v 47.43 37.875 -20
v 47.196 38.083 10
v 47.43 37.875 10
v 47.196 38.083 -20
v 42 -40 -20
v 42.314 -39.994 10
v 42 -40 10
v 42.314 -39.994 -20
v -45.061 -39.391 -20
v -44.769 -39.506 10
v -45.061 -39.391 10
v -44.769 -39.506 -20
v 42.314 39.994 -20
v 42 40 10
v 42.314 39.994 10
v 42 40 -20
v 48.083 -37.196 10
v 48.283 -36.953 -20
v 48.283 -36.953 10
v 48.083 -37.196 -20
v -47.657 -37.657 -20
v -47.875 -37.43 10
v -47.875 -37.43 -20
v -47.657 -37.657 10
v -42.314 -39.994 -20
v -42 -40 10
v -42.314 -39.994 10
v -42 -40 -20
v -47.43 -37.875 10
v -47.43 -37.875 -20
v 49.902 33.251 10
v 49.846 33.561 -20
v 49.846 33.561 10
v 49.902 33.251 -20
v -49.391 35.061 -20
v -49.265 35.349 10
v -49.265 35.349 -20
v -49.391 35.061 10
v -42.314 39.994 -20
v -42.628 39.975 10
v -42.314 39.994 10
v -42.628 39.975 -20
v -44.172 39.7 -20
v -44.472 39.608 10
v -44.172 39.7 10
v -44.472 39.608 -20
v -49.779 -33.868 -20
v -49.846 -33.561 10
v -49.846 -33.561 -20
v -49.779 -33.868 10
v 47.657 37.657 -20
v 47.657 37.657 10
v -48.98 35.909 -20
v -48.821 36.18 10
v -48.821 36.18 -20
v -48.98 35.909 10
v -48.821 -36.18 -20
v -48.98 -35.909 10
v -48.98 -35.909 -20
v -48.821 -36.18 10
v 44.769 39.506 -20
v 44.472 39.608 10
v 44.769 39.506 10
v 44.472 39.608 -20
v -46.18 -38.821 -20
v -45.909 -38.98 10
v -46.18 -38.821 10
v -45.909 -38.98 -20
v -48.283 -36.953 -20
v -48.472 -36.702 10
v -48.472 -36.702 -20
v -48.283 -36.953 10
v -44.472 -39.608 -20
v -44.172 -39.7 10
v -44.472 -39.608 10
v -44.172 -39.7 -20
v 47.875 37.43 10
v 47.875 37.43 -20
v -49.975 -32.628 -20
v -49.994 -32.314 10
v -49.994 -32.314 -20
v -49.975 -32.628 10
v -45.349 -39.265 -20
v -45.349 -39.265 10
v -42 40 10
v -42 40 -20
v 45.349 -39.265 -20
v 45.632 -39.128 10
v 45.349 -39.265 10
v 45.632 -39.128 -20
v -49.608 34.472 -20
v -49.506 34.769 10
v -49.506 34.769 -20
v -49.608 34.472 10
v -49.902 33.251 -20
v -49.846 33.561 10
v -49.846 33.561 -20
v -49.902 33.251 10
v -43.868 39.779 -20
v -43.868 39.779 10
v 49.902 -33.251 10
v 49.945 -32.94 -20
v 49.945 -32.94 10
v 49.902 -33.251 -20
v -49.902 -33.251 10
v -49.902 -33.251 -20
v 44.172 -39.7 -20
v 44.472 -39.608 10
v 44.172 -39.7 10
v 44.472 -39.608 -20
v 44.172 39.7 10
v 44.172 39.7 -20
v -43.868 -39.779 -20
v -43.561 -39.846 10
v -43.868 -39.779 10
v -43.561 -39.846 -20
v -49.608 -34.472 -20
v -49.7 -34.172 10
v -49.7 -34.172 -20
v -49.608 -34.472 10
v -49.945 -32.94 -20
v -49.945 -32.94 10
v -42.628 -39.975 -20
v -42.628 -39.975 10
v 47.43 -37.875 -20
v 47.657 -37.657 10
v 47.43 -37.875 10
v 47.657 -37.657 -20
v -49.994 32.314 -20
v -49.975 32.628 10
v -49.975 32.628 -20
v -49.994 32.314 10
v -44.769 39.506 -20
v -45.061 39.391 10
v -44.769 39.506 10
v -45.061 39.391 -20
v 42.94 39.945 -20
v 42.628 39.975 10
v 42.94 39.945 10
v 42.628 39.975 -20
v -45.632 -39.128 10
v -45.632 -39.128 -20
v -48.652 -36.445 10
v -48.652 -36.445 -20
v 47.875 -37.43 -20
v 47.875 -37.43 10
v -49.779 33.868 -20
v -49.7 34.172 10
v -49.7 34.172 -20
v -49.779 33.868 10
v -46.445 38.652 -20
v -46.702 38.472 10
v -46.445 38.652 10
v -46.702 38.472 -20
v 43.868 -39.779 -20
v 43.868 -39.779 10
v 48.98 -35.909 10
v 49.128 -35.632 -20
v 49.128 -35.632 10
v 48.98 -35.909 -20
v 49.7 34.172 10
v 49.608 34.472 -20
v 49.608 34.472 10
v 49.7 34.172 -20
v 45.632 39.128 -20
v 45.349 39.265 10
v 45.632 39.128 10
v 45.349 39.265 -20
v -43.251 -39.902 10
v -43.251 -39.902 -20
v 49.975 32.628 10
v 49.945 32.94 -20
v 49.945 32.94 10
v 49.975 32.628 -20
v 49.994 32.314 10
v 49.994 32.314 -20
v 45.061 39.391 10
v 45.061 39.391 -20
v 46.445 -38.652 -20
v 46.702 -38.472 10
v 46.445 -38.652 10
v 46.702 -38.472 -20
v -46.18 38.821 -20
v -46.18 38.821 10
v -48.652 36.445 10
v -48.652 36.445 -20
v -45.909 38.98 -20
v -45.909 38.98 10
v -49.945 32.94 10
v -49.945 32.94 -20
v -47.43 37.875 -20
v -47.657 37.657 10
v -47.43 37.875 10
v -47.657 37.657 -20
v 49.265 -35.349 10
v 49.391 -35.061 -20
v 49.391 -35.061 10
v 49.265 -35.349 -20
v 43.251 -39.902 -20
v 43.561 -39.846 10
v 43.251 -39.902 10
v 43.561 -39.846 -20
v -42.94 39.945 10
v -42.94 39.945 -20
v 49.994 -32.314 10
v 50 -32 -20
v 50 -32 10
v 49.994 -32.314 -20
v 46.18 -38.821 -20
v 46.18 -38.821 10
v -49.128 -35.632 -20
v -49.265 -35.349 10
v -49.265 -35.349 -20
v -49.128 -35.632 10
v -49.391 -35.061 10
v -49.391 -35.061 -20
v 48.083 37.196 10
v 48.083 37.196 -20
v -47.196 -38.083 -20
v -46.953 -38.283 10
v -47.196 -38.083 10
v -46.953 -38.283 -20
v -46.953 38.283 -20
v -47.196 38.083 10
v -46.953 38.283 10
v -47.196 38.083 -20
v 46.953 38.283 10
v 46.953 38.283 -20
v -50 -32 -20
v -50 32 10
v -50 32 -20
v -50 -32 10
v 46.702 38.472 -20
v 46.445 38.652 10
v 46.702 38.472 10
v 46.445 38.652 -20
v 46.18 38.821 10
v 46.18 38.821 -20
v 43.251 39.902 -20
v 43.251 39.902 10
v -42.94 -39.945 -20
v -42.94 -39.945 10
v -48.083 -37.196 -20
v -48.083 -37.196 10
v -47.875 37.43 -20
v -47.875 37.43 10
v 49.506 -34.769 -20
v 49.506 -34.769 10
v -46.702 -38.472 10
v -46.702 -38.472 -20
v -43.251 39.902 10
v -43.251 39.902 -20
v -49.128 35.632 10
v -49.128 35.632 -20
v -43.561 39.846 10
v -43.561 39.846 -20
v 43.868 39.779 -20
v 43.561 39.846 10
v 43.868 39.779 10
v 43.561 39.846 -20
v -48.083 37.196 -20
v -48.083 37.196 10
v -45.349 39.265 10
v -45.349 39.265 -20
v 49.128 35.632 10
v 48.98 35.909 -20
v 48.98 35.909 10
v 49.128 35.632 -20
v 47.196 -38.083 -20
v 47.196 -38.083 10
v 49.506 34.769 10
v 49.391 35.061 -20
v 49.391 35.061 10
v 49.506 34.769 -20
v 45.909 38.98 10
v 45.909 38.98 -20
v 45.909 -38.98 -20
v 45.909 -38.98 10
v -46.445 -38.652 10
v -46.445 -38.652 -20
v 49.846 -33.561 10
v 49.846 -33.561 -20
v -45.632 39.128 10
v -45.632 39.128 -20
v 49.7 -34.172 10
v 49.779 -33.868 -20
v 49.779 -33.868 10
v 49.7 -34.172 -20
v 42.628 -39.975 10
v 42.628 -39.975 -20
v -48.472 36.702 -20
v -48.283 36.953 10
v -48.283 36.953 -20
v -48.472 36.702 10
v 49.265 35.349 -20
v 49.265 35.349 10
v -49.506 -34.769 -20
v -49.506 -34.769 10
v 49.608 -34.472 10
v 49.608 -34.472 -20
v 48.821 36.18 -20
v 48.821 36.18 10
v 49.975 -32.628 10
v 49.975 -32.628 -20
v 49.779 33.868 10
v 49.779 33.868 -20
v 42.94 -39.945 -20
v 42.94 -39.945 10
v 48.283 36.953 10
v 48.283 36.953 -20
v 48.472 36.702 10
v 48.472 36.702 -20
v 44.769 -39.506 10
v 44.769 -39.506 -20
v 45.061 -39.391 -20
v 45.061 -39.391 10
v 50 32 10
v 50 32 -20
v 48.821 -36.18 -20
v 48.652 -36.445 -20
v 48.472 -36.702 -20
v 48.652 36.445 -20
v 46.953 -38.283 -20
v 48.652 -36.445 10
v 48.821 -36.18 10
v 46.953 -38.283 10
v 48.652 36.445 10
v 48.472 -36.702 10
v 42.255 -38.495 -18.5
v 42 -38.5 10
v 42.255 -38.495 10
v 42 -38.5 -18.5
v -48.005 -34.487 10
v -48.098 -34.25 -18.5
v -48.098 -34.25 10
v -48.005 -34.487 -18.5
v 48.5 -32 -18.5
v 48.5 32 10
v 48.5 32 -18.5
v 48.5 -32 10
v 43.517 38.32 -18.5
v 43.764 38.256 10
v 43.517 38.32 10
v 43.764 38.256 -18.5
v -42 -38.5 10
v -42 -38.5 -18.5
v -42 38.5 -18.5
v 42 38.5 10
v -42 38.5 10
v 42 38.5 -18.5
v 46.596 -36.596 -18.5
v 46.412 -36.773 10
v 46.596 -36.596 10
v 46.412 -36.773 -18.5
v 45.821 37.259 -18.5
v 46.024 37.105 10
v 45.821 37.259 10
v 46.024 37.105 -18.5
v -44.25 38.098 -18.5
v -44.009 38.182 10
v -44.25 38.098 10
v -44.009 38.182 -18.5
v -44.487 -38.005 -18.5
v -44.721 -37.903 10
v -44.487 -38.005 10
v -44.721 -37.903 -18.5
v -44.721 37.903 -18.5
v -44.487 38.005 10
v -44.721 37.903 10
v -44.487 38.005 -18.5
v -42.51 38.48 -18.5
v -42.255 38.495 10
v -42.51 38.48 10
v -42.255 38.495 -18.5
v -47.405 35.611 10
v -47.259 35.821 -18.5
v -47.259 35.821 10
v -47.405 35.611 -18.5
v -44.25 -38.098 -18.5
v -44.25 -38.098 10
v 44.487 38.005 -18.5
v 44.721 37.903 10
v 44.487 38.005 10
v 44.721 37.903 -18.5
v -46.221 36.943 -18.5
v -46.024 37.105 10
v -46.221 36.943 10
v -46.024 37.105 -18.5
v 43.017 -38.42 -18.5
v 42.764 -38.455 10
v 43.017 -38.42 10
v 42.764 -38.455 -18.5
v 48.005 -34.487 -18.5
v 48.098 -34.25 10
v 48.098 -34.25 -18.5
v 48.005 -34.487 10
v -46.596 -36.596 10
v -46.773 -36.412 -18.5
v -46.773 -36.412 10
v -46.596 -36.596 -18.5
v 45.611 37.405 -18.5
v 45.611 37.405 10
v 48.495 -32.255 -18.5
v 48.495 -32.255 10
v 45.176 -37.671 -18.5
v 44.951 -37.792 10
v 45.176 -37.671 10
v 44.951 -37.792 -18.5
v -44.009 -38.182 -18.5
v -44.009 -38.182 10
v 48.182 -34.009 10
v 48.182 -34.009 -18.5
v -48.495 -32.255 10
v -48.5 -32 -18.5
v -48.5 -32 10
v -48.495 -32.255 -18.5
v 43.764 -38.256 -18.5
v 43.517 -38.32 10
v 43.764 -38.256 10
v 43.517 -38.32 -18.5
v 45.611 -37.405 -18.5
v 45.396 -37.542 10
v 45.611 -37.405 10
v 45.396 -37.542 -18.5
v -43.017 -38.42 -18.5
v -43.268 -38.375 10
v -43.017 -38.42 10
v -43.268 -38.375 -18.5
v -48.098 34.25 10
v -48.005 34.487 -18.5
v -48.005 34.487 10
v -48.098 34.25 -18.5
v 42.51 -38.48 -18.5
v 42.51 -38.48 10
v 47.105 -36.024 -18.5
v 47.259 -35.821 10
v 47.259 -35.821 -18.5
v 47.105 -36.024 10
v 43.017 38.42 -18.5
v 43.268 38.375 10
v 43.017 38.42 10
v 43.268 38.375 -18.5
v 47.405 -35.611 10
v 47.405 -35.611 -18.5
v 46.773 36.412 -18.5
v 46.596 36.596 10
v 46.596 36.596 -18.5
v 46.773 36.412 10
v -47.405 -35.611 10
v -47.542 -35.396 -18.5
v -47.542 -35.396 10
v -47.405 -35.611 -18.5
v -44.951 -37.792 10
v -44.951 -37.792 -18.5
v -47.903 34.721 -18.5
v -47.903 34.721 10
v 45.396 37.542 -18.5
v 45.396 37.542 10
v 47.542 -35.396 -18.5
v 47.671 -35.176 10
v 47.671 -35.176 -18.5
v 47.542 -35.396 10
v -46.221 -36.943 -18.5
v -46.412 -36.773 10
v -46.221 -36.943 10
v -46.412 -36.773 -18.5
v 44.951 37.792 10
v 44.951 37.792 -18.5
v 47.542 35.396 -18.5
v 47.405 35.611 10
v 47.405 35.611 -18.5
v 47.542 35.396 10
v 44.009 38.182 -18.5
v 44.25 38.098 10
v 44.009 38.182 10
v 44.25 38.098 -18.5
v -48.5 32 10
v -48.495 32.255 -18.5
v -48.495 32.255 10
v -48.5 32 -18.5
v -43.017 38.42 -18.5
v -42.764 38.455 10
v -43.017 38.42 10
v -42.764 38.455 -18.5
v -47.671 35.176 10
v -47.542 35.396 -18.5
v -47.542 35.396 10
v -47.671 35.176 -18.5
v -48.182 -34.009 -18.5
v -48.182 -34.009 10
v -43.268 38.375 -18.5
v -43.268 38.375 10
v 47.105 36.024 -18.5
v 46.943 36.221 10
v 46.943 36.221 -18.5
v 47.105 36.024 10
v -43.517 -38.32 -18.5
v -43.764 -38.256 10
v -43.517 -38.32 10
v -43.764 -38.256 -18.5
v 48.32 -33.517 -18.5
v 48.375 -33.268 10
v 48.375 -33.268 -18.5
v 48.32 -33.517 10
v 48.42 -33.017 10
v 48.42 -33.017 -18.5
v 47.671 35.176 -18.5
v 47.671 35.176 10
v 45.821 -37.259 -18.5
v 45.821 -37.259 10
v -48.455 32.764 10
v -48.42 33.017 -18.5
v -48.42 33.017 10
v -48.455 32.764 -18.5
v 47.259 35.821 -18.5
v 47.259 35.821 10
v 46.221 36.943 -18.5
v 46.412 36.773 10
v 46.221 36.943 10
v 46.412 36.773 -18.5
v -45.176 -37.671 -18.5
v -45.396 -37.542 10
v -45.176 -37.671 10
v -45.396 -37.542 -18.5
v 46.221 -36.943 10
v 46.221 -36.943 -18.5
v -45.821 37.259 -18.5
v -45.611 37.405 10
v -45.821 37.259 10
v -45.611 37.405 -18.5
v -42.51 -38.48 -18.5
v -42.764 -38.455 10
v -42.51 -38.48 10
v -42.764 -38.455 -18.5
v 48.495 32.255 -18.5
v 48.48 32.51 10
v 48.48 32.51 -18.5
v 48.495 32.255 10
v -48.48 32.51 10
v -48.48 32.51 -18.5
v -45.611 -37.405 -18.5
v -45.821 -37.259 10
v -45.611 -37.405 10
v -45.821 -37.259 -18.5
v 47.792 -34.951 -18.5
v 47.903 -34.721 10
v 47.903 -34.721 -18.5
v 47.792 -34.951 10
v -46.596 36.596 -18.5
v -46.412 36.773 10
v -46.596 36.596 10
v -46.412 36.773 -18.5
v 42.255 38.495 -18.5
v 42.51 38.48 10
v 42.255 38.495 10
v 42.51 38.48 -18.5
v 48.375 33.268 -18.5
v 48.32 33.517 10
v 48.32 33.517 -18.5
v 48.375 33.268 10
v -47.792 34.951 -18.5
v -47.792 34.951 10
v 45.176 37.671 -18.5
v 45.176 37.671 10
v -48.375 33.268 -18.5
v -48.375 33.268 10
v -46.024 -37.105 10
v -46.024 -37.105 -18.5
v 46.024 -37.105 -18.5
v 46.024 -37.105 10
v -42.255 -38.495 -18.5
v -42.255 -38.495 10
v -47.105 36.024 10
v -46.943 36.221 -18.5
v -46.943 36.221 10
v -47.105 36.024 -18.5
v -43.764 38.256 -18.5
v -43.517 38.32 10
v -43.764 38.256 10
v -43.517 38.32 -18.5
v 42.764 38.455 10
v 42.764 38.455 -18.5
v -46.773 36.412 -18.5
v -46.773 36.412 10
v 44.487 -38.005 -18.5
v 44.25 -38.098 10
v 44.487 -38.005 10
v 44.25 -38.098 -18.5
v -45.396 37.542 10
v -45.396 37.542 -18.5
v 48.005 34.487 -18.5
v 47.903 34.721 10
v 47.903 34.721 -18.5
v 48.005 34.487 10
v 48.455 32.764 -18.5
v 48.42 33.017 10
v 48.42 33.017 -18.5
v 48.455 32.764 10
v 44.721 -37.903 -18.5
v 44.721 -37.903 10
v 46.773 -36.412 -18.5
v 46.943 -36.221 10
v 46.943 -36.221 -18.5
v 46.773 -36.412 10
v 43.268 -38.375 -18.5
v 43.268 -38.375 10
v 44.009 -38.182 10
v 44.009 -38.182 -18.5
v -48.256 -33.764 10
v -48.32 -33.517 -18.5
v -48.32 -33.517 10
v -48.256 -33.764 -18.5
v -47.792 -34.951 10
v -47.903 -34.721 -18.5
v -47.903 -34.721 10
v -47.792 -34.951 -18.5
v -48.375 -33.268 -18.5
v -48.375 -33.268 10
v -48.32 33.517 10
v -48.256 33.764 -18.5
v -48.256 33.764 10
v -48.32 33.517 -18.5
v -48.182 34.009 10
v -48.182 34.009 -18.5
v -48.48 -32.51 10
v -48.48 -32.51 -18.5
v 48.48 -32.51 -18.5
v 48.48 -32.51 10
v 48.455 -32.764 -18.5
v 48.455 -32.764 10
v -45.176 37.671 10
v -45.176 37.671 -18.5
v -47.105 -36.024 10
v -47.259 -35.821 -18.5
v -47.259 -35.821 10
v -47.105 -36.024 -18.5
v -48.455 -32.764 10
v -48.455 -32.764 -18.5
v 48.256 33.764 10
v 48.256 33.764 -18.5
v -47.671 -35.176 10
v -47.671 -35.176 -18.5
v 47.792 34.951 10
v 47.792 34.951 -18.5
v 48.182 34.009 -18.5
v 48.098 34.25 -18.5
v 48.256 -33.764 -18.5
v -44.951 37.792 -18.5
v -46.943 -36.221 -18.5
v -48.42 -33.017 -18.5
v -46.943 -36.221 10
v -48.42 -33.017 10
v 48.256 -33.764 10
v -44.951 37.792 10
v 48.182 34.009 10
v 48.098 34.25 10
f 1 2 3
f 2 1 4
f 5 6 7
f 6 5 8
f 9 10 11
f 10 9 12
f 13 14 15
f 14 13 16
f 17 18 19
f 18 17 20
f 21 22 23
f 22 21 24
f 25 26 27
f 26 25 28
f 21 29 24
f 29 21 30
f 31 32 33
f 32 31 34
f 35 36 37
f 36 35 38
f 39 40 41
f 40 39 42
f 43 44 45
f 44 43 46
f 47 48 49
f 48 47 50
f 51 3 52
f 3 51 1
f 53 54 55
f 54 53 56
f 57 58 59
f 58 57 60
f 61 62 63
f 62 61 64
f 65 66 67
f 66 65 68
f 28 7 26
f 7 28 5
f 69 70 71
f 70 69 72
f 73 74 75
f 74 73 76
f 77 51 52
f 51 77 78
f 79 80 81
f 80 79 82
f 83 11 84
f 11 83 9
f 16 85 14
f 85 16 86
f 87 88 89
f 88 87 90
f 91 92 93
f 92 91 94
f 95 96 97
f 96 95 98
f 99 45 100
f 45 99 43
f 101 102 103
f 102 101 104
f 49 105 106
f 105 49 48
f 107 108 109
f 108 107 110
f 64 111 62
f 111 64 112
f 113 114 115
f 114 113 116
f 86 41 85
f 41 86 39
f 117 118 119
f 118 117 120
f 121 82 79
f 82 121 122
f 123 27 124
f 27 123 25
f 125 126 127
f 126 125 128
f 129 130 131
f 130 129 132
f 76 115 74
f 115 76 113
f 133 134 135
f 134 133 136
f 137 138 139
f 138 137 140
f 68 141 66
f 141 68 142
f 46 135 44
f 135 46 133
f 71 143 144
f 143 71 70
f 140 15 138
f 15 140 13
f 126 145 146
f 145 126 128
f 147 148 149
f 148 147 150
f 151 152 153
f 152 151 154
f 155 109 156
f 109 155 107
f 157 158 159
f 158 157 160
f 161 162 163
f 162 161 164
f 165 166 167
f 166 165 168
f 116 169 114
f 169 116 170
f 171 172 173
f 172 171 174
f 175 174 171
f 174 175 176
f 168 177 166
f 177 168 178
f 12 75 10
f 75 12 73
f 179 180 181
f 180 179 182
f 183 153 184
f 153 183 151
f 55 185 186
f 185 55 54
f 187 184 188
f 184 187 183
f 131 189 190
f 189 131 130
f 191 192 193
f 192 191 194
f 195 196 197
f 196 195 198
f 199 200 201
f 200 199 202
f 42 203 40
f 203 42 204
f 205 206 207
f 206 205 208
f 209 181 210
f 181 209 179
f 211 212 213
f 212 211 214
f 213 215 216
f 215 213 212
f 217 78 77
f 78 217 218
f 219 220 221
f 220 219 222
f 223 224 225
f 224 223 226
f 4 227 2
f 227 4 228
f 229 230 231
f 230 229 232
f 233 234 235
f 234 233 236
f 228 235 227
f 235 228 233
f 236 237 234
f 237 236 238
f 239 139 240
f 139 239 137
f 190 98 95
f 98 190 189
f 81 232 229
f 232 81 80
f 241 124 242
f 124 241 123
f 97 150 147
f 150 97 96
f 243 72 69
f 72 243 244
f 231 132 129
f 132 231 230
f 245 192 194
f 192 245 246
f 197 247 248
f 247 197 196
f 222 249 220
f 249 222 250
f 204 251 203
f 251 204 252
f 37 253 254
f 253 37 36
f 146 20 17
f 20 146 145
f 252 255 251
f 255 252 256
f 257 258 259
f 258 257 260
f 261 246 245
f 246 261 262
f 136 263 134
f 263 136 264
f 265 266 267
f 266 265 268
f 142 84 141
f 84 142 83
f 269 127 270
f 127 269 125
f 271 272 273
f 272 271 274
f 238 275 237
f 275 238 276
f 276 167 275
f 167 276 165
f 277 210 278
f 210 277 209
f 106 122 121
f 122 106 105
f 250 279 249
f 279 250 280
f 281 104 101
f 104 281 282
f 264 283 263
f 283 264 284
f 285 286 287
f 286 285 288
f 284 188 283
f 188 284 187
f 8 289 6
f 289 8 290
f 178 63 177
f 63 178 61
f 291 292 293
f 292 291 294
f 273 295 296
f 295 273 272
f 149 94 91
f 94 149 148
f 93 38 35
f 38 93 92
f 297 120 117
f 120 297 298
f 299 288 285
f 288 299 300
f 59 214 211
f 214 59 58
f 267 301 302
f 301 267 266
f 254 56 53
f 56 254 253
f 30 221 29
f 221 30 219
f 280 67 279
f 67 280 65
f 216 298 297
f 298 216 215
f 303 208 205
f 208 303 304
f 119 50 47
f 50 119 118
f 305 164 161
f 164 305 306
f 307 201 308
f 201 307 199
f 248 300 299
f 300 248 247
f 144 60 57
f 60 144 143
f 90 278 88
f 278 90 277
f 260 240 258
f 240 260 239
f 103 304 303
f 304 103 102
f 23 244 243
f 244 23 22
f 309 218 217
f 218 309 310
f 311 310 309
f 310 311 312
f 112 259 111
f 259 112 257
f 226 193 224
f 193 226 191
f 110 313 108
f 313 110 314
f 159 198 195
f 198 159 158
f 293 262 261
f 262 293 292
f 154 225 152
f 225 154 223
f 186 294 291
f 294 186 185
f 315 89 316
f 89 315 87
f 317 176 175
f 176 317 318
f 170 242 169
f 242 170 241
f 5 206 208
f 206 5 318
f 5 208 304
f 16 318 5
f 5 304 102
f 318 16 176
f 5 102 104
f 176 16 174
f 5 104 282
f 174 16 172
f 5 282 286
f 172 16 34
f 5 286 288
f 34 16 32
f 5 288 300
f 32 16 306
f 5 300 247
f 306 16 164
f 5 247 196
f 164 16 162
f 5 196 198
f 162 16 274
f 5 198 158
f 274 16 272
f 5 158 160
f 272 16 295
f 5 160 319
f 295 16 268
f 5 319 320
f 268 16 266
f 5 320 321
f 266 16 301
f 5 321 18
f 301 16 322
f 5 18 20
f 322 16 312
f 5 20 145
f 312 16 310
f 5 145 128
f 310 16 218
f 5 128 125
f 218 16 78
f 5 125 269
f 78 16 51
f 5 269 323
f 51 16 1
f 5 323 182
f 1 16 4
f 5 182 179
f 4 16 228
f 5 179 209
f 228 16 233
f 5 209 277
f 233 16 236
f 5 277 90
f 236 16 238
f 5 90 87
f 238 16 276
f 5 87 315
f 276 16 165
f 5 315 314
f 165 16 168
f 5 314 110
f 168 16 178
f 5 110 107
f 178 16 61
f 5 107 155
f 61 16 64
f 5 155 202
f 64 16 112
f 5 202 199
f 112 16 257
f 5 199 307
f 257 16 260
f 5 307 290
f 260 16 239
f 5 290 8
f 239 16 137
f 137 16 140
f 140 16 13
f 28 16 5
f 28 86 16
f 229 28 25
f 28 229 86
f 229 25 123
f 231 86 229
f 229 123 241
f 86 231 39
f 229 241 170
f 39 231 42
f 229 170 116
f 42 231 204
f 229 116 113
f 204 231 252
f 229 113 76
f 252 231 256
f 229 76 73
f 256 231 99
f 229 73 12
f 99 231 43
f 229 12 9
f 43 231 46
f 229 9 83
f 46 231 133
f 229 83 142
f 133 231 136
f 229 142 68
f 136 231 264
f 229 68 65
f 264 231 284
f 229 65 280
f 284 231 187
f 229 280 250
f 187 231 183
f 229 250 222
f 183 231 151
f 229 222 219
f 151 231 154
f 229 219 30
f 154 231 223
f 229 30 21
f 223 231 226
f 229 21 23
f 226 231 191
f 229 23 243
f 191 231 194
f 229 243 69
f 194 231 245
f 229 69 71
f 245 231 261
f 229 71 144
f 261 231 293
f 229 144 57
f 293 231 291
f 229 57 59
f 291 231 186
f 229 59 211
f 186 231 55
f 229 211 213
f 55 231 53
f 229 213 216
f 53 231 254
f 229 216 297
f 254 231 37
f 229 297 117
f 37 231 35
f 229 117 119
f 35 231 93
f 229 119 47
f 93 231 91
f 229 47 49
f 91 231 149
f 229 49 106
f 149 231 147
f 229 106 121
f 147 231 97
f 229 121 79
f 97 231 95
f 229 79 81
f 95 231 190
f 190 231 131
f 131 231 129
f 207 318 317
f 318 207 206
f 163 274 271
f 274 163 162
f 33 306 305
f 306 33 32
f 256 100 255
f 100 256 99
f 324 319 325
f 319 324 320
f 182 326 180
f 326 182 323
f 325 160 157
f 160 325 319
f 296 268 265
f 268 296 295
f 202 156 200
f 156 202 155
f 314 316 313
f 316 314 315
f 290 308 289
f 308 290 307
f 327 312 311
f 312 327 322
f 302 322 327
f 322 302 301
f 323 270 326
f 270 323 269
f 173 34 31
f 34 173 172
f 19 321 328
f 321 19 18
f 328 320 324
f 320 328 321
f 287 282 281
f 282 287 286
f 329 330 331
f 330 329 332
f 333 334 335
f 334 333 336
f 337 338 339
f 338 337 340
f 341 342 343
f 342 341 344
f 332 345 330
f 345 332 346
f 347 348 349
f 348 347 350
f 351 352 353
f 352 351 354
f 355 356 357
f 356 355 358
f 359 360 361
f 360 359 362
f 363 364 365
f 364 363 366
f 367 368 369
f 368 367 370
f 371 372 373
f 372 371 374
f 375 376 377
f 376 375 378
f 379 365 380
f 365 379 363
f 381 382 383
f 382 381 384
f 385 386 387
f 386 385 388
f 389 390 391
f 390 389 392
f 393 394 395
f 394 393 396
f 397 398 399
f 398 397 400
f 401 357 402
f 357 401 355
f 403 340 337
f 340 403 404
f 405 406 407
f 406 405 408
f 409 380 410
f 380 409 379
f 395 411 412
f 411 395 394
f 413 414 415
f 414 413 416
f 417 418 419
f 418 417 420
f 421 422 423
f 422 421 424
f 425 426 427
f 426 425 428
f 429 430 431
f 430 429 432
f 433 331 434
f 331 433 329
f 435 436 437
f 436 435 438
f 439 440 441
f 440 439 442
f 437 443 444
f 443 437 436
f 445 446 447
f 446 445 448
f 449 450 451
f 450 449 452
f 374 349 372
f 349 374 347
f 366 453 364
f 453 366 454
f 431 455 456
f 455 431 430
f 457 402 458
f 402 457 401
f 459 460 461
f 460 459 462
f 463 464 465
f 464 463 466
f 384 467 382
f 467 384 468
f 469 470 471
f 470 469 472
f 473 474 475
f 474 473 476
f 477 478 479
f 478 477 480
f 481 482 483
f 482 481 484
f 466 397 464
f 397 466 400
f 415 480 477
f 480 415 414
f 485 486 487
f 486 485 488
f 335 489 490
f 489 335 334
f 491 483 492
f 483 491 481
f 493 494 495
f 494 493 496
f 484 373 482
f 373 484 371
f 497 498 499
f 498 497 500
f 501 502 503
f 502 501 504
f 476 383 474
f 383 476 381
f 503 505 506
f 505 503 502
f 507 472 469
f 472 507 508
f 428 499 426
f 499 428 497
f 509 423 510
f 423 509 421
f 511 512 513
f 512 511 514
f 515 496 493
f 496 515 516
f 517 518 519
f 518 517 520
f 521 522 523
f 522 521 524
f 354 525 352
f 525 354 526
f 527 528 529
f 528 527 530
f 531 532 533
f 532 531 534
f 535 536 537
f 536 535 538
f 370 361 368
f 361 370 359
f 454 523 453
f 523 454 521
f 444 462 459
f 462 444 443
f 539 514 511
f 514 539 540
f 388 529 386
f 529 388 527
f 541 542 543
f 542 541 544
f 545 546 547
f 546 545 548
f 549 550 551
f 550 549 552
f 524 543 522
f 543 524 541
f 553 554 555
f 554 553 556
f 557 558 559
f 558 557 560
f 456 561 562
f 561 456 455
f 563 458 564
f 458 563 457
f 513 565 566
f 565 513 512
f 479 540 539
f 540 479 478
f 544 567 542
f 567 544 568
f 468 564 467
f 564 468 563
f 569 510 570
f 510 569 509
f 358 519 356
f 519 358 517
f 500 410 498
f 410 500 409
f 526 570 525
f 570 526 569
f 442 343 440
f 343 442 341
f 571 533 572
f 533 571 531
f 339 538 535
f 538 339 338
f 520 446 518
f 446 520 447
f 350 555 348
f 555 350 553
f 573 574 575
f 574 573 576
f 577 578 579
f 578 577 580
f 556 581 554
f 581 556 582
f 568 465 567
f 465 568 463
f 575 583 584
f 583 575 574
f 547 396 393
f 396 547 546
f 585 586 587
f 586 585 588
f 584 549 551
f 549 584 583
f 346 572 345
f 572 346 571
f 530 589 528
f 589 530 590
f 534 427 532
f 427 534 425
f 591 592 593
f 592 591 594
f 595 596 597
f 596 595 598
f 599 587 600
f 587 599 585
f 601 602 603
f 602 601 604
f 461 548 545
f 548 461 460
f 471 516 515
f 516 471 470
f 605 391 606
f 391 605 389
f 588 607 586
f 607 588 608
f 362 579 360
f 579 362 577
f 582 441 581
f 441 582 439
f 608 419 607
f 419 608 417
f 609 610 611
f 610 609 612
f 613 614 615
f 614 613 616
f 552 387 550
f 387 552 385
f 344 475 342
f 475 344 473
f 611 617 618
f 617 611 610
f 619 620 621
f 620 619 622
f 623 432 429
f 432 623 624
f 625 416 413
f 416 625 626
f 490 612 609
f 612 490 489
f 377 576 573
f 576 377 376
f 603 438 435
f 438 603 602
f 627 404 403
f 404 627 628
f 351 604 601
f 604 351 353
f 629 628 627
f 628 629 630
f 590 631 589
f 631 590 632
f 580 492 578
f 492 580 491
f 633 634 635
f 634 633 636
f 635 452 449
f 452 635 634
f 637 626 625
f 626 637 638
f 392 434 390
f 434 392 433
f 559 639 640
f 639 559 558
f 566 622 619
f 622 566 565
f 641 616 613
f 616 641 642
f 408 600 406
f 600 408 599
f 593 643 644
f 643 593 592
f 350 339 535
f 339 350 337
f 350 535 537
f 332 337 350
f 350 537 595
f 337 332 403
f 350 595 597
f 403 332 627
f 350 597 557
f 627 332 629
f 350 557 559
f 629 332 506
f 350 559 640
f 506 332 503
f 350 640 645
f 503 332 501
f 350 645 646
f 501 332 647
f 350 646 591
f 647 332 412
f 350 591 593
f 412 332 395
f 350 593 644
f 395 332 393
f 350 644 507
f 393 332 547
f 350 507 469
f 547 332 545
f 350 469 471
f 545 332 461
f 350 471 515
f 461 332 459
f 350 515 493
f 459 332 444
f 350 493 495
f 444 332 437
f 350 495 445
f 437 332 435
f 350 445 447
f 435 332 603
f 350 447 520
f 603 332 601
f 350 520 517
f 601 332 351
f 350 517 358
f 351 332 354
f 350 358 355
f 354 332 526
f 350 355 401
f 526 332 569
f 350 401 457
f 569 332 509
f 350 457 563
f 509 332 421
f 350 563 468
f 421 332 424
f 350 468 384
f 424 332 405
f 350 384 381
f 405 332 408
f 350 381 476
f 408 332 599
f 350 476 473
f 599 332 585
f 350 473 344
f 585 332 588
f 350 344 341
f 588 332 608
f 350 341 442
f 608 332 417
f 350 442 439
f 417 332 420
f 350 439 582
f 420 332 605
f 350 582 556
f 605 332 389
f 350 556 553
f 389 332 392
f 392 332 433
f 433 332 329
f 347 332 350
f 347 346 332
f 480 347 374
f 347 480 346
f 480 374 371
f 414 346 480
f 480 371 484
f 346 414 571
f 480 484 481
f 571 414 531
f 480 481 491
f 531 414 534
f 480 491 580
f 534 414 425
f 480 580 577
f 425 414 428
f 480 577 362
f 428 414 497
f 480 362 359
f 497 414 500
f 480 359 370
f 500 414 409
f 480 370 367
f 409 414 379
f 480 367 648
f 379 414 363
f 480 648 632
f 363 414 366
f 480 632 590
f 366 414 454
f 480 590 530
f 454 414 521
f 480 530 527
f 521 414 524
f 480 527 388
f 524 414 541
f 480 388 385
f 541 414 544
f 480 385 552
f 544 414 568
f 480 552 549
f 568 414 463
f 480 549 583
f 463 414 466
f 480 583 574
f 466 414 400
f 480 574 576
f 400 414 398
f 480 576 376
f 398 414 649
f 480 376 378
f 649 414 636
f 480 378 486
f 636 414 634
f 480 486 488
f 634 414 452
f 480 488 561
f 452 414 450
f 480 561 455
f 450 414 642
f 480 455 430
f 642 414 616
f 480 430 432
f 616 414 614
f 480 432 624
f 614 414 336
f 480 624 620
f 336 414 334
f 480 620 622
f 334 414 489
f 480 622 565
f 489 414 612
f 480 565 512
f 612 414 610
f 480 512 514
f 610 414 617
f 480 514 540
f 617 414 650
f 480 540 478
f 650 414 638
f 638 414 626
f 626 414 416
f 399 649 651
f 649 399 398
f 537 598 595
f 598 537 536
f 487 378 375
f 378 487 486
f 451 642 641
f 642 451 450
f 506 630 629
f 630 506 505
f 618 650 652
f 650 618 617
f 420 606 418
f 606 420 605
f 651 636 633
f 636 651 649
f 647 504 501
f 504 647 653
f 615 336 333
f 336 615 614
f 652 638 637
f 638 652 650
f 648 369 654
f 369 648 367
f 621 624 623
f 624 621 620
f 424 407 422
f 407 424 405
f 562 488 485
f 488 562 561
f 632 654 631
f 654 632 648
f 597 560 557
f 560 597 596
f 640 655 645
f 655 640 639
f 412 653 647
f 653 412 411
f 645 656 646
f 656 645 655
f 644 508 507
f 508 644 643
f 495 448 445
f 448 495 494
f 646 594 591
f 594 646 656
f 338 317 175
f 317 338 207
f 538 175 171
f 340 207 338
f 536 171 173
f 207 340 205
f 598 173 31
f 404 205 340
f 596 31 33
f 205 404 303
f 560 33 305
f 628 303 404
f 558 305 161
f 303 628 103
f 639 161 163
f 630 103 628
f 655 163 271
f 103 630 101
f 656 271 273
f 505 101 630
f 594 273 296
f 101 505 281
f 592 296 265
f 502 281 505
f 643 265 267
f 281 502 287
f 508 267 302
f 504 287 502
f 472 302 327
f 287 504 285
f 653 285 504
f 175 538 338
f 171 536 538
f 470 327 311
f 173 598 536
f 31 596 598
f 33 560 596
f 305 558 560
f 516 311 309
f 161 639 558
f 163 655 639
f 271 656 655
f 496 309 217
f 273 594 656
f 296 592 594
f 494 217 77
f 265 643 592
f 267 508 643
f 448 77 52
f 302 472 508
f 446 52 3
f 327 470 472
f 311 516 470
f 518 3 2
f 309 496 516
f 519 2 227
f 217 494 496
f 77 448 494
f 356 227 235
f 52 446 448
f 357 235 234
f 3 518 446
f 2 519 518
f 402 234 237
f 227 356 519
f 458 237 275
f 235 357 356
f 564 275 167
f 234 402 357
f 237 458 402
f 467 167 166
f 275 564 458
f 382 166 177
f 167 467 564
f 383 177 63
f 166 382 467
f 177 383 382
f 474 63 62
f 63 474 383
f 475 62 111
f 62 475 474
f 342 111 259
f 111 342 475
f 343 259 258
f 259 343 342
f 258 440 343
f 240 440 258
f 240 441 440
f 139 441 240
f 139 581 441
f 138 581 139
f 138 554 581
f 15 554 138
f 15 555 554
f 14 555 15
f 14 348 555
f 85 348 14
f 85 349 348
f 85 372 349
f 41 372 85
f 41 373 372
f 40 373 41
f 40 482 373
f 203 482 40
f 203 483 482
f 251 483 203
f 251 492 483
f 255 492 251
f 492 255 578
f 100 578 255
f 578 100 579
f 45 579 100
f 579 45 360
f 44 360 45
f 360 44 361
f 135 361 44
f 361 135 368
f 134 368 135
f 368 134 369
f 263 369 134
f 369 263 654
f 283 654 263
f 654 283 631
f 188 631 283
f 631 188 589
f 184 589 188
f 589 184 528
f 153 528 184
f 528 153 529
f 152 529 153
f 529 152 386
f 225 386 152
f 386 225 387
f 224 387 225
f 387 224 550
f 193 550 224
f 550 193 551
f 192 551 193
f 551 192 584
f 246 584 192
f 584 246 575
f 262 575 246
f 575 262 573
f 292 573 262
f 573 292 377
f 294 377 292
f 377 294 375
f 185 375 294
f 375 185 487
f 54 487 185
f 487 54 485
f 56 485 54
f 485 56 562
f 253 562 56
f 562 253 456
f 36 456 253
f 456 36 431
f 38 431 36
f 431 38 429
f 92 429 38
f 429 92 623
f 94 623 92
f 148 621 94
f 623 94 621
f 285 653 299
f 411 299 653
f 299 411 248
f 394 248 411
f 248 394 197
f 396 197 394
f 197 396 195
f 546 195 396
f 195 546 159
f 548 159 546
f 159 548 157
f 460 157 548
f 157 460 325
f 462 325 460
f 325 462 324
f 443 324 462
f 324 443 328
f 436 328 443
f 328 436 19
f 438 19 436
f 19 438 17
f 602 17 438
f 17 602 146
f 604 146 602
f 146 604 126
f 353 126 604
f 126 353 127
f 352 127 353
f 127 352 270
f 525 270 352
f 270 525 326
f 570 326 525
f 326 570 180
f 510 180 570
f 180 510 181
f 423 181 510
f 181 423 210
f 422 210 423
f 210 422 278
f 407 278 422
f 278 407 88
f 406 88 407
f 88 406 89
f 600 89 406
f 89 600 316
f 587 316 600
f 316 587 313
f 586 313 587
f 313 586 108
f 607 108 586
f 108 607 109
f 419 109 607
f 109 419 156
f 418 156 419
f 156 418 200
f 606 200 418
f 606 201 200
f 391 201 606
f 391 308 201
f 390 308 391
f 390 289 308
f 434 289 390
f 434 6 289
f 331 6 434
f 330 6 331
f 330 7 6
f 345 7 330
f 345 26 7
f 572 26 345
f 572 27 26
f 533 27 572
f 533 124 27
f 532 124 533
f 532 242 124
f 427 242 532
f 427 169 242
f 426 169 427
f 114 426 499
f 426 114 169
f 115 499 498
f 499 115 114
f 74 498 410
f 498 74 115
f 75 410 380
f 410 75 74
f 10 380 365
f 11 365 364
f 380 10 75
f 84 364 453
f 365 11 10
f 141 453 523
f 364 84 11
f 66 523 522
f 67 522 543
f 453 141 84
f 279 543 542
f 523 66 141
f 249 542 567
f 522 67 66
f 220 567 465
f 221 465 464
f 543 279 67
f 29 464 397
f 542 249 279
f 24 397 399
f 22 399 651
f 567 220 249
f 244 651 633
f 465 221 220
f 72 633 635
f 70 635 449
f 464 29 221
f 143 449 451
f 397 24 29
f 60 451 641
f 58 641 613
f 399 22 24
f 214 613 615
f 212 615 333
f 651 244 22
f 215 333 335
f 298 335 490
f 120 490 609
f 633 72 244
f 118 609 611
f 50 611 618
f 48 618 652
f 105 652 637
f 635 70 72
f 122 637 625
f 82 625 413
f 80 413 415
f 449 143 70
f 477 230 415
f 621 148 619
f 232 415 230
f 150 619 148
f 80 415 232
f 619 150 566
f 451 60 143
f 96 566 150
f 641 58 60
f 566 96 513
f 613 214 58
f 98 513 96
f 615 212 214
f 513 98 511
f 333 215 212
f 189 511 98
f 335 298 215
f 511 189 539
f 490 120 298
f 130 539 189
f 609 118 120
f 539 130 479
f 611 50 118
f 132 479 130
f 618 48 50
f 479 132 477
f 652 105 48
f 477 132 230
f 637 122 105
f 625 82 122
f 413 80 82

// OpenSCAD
// Start: lazy_union
default_5_default_5();
// End: lazy_union

// Modules.

// 'PartMaterial undef-default - default 5.0'
module default_5_default_5() {
  // 'None : _combine_solids_and_holes'
  union() {
    // '_combine_solids_and_holes'
    difference() {
      // 'default : _combine_solids_and_holes'
      union() {
        // 'outer : _combine_solids_and_holes'
        union() {
          // 'hull'
          multmatrix(m=[[1.0, 0.0, 0.0, -50.0], [0.0, 1.0, 0.0, -40.0], [0.0, 0.0, 1.0, -20.0], [0.0, 0.0, 0.0, 1.0]]) {
            // 'hull : _combine_solids_and_holes'
            union() {
              // 'hull'
              linear_extrude(height=40.0, twist=0.0, slices=4, scale=[1.0, 1.0]) {
                polygon(points=[[8.0, 0.0], [92.0, 0.0], [92.31407852607255, 0.006167710074215904], [92.62767276582277, 0.024661330134974513], [92.9402991796627, 0.05545234436058699], [93.25147572032185, 0.09849327523889428], [93.56072257612902, 0.15371775677415211], [93.86756291084724, 0.22104063681858133], [94.1715235989206, 0.30035810837081556], [94.47213595499959, 0.39154786963876553], [94.76893645661995, 0.4944693126201196], [95.06146745892073, 0.6089637399096981], [95.34927790029943, 0.7348546093993411], [95.63192399791639, 0.8719478064930488], [95.90896993197565, 1.0200319434176146], [96.1799885177276, 1.1788786851672537], [96.44456186415682, 1.3482431015796292], [96.7022820183398, 1.5278640450004124], [96.95275159447868, 1.7174645529540316], [97.19558438664149, 1.9167522751997437], [97.43040596426354, 2.1254199245145067], [97.6568542494924, 2.3431457505076114], [97.8745800754855, 2.5695940357364577], [98.08324772480026, 2.8044156133585236], [98.28253544704597, 3.0472484055213194], [98.47213595499959, 3.297717981660207], [98.65175689842037, 3.5554381358431764], [98.82112131483275, 3.8200114822724034], [98.9799680565824, 4.091030068024356], [99.12805219350696, 4.368076002083621], [99.26514539060067, 4.65072209970057], [99.3910362600903, 4.938532541079277], [99.50553068737989, 5.231063543380053], [99.60845213036124, 5.527864045000419], [99.6996418916292, 5.828476401079403], [99.77895936318143, 6.132437089152755], [99.84628224322586, 6.439277423870973], [99.90150672476112, 6.7485242796781515], [99.94454765563943, 7.059700820337298], [99.97533866986504, 7.37232723417724], [99.99383228992579, 7.685921473927451], [100.00000000000001, 8.0], [100.0, 72.0], [99.99383228992578, 72.31407852607255], [99.97533866986502, 72.62767276582277], [99.94454765563941, 72.9402991796627], [99.9015067247611, 73.25147572032185], [99.84628224322584, 73.56072257612902], [99.77895936318141, 73.86756291084724], [99.69964189162918, 74.17152359892059], [99.60845213036123, 74.47213595499957], [99.50553068737987, 74.76893645661994], [99.39103626009029, 75.06146745892072], [99.26514539060065, 75.34927790029943], [99.12805219350695, 75.63192399791637], [98.97996805658238, 75.90896993197563], [98.82112131483274, 76.17998851772758], [98.65175689842036, 76.44456186415681], [98.47213595499957, 76.70228201833977], [98.28253544704596, 76.95275159447866], [98.08324772480024, 77.19558438664146], [97.87458007548548, 77.43040596426353], [97.65685424949238, 77.65685424949237], [97.43040596426353, 77.87458007548547], [97.19558438664147, 78.08324772480023], [96.95275159447867, 78.28253544704594], [96.70228201833979, 78.47213595499957], [96.44456186415681, 78.65175689842035], [96.1799885177276, 78.82112131483272], [95.90896993197563, 78.97996805658236], [95.63192399791637, 79.12805219350693], [95.34927790029943, 79.26514539060064], [95.06146745892072, 79.39103626009027], [94.76893645661994, 79.50553068737986], [94.47213595499957, 79.60845213036121], [94.17152359892059, 79.69964189162916], [93.86756291084724, 79.77895936318139], [93.56072257612902, 79.84628224322582], [93.25147572032185, 79.90150672476108], [92.9402991796627, 79.94454765563938], [92.62767276582277, 79.975338669865], [92.31407852607255, 79.99383228992576], [92.0, 79.99999999999997], [8.0, 80.0], [7.685921473927451, 79.99383228992578], [7.37232723417724, 79.97533866986502], [7.059700820337299, 79.94454765563941], [6.748524279678152, 79.9015067247611], [6.439277423870974, 79.84628224322584], [6.132437089152757, 79.77895936318141], [5.8284764010794055, 79.69964189162918], [5.52786404500042, 79.60845213036123], [5.231063543380056, 79.50553068737987], [4.938532541079281, 79.39103626009029], [4.650722099700573, 79.26514539060065], [4.368076002083625, 79.12805219350695], [4.0910300680243585, 78.97996805658238], [3.8200114822724087, 78.82112131483274], [3.5554381358431835, 78.65175689842036], [3.297717981660215, 78.47213595499957], [3.0472484055213265, 78.28253544704596], [2.8044156133585307, 78.08324772480024], [2.5695940357364675, 77.87458007548548], [2.3431457505076194, 77.65685424949238], [2.1254199245145147, 77.43040596426353], [1.9167522751997517, 77.19558438664147], [1.7174645529540413, 76.95275159447867], [1.5278640450004204, 76.70228201833979], [1.3482431015796363, 76.44456186415681], [1.1788786851672617, 76.1799885177276], [1.0200319434176235, 75.90896993197565], [0.8719478064930568, 75.63192399791637], [0.7348546093993482, 75.34927790029943], [0.6089637399097052, 75.06146745892072], [0.4944693126201267, 74.76893645661994], [0.39154786963877086, 74.47213595499959], [0.3003581083708209, 74.17152359892059], [0.22104063681858666, 73.86756291084724], [0.15371775677415567, 73.56072257612902], [0.09849327523889784, 73.25147572032185], [0.05545234436058877, 72.9402991796627], [0.0246613301349754, 72.62767276582277], [0.006167710074215904, 72.31407852607255], [-8.881784197001252e-16, 72.0], [0.0, 8.0], [0.006167710074216792, 7.68592147392745], [0.02466133013497629, 7.372327234177241], [0.055452344360589656, 7.059700820337301], [0.09849327523889784, 6.748524279678153], [0.15371775677415656, 6.439277423870973], [0.22104063681858666, 6.1324370891527575], [0.3003581083708209, 5.828476401079408], [0.39154786963877086, 5.527864045000421], [0.4944693126201267, 5.2310635433800545], [0.6089637399097052, 4.938532541079282], [0.73485460939935, 4.650722099700575], [0.8719478064930568, 4.368076002083626], [1.0200319434176235, 4.091030068024359], [1.1788786851672617, 3.8200114822724105], [1.3482431015796363, 3.5554381358431844], [1.5278640450004204, 3.297717981660216], [1.7174645529540413, 3.0472484055213274], [1.9167522751997517, 2.8044156133585316], [2.125419924514514, 2.5695940357364684], [2.3431457505076185, 2.3431457505076203], [2.5695940357364666, 2.1254199245145156], [2.8044156133585325, 1.9167522751997508], [3.0472484055213256, 1.7174645529540422], [3.297717981660214, 1.5278640450004213], [3.5554381358431826, 1.3482431015796381], [3.8200114822724114, 1.1788786851672608], [4.091030068024358, 1.0200319434176244], [4.368076002083624, 0.8719478064930577], [4.650722099700575, 0.7348546093993491], [4.938532541079277, 0.6089637399097079], [5.231063543380053, 0.4944693126201276], [5.527864045000419, 0.39154786963877175], [5.828476401079406, 0.3003581083708218], [6.132437089152758, 0.22104063681858666], [6.43927742387097, 0.15371775677415744], [6.748524279678151, 0.09849327523889873], [7.059700820337298, 0.055452344360589656], [7.372327234177234, 0.02466133013497629], [7.685921473927447, 0.006167710074216792]]);
              }
            }
          }
        }
      }
      // 'main'
      union() {
        // 'hull'
        multmatrix(m=[[1.0, 0.0, 0.0, -48.5], [0.0, 1.0, 0.0, -38.5], [0.0, 0.0, 1.0, -18.5], [0.0, 0.0, 0.0, 1.0]]) {
          // 'hull : _combine_solids_and_holes'
          union() {
            // 'hull'
            linear_extrude(height=37.0, twist=0.0, slices=4, scale=[1.0, 1.0]) {
              polygon(points=[[6.5, 0.0], [90.5, 0.0], [90.75518880243395, 0.005011264435299978], [91.00998412223099, 0.020037330734667513], [91.26399308347594, 0.045055029792977486], [91.5168240227615, 0.08002578613160338], [91.76808709310484, 0.12489567737900042], [92.01739486506338, 0.17959551741509916], [92.26436292412298, 0.2440409630512903], [92.50861046343715, 0.31813264408149866], [92.7497608710037, 0.40175631650385046], [92.98744231037308, 0.49478303867663254], [93.22128829399328, 0.5970693701369685], [93.45093824830705, 0.7084575927756056], [93.67603806973021, 0.8287759540268151], [93.89624067065367, 0.9578389316983973], [94.11120651462741, 1.095447520033452], [94.32060413990108, 1.2413895365628385], [94.52411067051392, 1.395439949275155], [94.72141231414619, 1.5573612235997958], [94.91220484596411, 1.726903688668041], [95.09619407771255, 1.9038059222874386], [95.27309631133195, 2.0877951540358763], [95.4426387764002, 2.278587685853805], [95.60456005072484, 2.475889329486077], [95.75861046343715, 2.679395860098923], [95.90455247996654, 2.8887934853725845], [96.0421610683016, 3.1037593293463317], [96.17122404597318, 3.3239619302697925], [96.29154240722438, 3.5490617516929444], [96.40293062986302, 3.7787117060067166], [96.50521696132336, 4.012557689626917], [96.59824368349614, 4.250239128996295], [96.68186735591848, 4.491389536562842], [96.7559590369487, 4.735637075877017], [96.82040448258489, 4.982605134936616], [96.87510432262098, 5.231912906895167], [96.91997421386839, 5.483175977238501], [96.95494497020701, 5.736006916524057], [96.97996266926532, 5.990015877769008], [96.99498873556468, 6.2448111975660545], [96.99999999999997, 6.500000000000001], [97.0, 70.5], [96.9949887355647, 70.75518880243395], [96.97996266926533, 71.00998412223099], [96.95494497020702, 71.26399308347594], [96.9199742138684, 71.5168240227615], [96.875104322621, 71.76808709310484], [96.8204044825849, 72.01739486506338], [96.75595903694871, 72.26436292412298], [96.6818673559185, 72.50861046343715], [96.59824368349615, 72.7497608710037], [96.50521696132336, 72.98744231037308], [96.40293062986302, 73.22128829399328], [96.2915424072244, 73.45093824830705], [96.17122404597318, 73.67603806973021], [96.0421610683016, 73.89624067065367], [95.90455247996654, 74.11120651462741], [95.75861046343715, 74.32060413990106], [95.60456005072484, 74.52411067051392], [95.4426387764002, 74.72141231414619], [95.27309631133195, 74.91220484596411], [95.09619407771255, 75.09619407771255], [94.91220484596413, 75.27309631133195], [94.72141231414619, 75.4426387764002], [94.52411067051392, 75.60456005072484], [94.32060413990108, 75.75861046343715], [94.11120651462741, 75.90455247996654], [93.89624067065367, 76.0421610683016], [93.67603806973021, 76.17122404597318], [93.45093824830705, 76.29154240722438], [93.22128829399328, 76.40293062986302], [92.98744231037308, 76.50521696132336], [92.7497608710037, 76.59824368349614], [92.50861046343715, 76.68186735591848], [92.26436292412298, 76.7559590369487], [92.01739486506338, 76.82040448258489], [91.76808709310484, 76.87510432262098], [91.5168240227615, 76.91997421386839], [91.26399308347594, 76.95494497020701], [91.00998412223099, 76.97996266926532], [90.75518880243395, 76.99498873556469], [90.5, 76.99999999999999], [6.5, 77.0], [6.244811197566054, 76.9949887355647], [5.990015877769007, 76.97996266926533], [5.736006916524055, 76.95494497020702], [5.483175977238499, 76.9199742138684], [5.231912906895166, 76.875104322621], [4.982605134936614, 76.8204044825849], [4.735637075877017, 76.75595903694871], [4.491389536562842, 76.6818673559185], [4.250239128996295, 76.59824368349615], [4.012557689626916, 76.50521696132337], [3.7787117060067157, 76.40293062986302], [3.5490617516929452, 76.2915424072244], [3.323961930269791, 76.17122404597318], [3.1037593293463317, 76.0421610683016], [2.8887934853725863, 75.90455247996654], [2.6793958600989245, 75.75861046343715], [2.475889329486078, 75.60456005072484], [2.2785876858538057, 75.4426387764002], [2.08779515403588, 75.27309631133195], [1.9038059222874404, 75.09619407771255], [1.7269036886680427, 74.91220484596413], [1.5573612235997984, 74.72141231414619], [1.3954399492751586, 74.52411067051392], [1.2413895365628411, 74.32060413990108], [1.0954475200334546, 74.11120651462741], [0.9578389316984, 73.89624067065367], [0.8287759540268187, 73.67603806973021], [0.7084575927756083, 73.45093824830705], [0.5970693701369703, 73.22128829399328], [0.4947830386766352, 72.98744231037308], [0.40175631650385313, 72.7497608710037], [0.3181326440815013, 72.50861046343717], [0.24404096305129208, 72.26436292412298], [0.17959551741510182, 72.01739486506338], [0.12489567737900131, 71.76808709310484], [0.08002578613160427, 71.5168240227615], [0.045055029792978374, 71.26399308347594], [0.020037330734667513, 71.00998412223099], [0.005011264435299978, 70.75518880243395], [-8.881784197001252e-16, 70.5], [0.0, 6.5], [0.005011264435300866, 6.244811197566053], [0.0200373307346684, 5.990015877769008], [0.04505502979297926, 5.736006916524056], [0.08002578613160427, 5.483175977238499], [0.1248956773790022, 5.231912906895165], [0.17959551741510182, 4.982605134936615], [0.24404096305129208, 4.735637075877019], [0.3181326440815013, 4.491389536562842], [0.40175631650385313, 4.250239128996295], [0.4947830386766352, 4.012557689626917], [0.597069370136972, 3.7787117060067166], [0.7084575927756083, 3.5490617516929466], [0.8287759540268187, 3.323961930269792], [0.9578389316984, 3.103759329346333], [1.0954475200334546, 2.8887934853725867], [1.2413895365628411, 2.679395860098925], [1.3954399492751586, 2.475889329486078], [1.5573612235997984, 2.2785876858538066], [1.7269036886680418, 2.08779515403588], [1.9038059222874395, 1.9038059222874413], [2.087795154035879, 1.7269036886680436], [2.2785876858538074, 1.5573612235997976], [2.475889329486077, 1.3954399492751595], [2.6793958600989236, 1.241389536562842], [2.8887934853725854, 1.0954475200334555], [3.103759329346334, 0.9578389316983991], [3.3239619302697903, 0.8287759540268196], [3.5490617516929444, 0.7084575927756092], [3.7787117060067175, 0.5970693701369711], [4.012557689626912, 0.49478303867663787], [4.250239128996293, 0.401756316503854], [4.49138953656284, 0.3181326440815022], [4.735637075877017, 0.24404096305129297], [4.982605134936616, 0.17959551741510182], [5.231912906895163, 0.12489567737900309], [5.483175977238497, 0.08002578613160516], [5.736006916524055, 0.04505502979297926], [5.990015877769003, 0.0200373307346684], [6.244811197566051, 0.005011264435300866]]);
            }
          }
        }
      }
      // 'default'
      multmatrix(m=[[-1.0, -0.0, -0.0, 100.0], [-0.0, -1.0, -0.0, 100.0], [0.0, 0.0, 1.0, 10.0], [0.0, 0.0, 0.0, 1.0]]) {
        // 'cut_box : _combine_solids_and_holes'
        union() {
          // 'cut_box'
          cube(size=[200.0, 200.0, 200.0]);
        }
      }
    }
  }
} // end module default_5_default_5
